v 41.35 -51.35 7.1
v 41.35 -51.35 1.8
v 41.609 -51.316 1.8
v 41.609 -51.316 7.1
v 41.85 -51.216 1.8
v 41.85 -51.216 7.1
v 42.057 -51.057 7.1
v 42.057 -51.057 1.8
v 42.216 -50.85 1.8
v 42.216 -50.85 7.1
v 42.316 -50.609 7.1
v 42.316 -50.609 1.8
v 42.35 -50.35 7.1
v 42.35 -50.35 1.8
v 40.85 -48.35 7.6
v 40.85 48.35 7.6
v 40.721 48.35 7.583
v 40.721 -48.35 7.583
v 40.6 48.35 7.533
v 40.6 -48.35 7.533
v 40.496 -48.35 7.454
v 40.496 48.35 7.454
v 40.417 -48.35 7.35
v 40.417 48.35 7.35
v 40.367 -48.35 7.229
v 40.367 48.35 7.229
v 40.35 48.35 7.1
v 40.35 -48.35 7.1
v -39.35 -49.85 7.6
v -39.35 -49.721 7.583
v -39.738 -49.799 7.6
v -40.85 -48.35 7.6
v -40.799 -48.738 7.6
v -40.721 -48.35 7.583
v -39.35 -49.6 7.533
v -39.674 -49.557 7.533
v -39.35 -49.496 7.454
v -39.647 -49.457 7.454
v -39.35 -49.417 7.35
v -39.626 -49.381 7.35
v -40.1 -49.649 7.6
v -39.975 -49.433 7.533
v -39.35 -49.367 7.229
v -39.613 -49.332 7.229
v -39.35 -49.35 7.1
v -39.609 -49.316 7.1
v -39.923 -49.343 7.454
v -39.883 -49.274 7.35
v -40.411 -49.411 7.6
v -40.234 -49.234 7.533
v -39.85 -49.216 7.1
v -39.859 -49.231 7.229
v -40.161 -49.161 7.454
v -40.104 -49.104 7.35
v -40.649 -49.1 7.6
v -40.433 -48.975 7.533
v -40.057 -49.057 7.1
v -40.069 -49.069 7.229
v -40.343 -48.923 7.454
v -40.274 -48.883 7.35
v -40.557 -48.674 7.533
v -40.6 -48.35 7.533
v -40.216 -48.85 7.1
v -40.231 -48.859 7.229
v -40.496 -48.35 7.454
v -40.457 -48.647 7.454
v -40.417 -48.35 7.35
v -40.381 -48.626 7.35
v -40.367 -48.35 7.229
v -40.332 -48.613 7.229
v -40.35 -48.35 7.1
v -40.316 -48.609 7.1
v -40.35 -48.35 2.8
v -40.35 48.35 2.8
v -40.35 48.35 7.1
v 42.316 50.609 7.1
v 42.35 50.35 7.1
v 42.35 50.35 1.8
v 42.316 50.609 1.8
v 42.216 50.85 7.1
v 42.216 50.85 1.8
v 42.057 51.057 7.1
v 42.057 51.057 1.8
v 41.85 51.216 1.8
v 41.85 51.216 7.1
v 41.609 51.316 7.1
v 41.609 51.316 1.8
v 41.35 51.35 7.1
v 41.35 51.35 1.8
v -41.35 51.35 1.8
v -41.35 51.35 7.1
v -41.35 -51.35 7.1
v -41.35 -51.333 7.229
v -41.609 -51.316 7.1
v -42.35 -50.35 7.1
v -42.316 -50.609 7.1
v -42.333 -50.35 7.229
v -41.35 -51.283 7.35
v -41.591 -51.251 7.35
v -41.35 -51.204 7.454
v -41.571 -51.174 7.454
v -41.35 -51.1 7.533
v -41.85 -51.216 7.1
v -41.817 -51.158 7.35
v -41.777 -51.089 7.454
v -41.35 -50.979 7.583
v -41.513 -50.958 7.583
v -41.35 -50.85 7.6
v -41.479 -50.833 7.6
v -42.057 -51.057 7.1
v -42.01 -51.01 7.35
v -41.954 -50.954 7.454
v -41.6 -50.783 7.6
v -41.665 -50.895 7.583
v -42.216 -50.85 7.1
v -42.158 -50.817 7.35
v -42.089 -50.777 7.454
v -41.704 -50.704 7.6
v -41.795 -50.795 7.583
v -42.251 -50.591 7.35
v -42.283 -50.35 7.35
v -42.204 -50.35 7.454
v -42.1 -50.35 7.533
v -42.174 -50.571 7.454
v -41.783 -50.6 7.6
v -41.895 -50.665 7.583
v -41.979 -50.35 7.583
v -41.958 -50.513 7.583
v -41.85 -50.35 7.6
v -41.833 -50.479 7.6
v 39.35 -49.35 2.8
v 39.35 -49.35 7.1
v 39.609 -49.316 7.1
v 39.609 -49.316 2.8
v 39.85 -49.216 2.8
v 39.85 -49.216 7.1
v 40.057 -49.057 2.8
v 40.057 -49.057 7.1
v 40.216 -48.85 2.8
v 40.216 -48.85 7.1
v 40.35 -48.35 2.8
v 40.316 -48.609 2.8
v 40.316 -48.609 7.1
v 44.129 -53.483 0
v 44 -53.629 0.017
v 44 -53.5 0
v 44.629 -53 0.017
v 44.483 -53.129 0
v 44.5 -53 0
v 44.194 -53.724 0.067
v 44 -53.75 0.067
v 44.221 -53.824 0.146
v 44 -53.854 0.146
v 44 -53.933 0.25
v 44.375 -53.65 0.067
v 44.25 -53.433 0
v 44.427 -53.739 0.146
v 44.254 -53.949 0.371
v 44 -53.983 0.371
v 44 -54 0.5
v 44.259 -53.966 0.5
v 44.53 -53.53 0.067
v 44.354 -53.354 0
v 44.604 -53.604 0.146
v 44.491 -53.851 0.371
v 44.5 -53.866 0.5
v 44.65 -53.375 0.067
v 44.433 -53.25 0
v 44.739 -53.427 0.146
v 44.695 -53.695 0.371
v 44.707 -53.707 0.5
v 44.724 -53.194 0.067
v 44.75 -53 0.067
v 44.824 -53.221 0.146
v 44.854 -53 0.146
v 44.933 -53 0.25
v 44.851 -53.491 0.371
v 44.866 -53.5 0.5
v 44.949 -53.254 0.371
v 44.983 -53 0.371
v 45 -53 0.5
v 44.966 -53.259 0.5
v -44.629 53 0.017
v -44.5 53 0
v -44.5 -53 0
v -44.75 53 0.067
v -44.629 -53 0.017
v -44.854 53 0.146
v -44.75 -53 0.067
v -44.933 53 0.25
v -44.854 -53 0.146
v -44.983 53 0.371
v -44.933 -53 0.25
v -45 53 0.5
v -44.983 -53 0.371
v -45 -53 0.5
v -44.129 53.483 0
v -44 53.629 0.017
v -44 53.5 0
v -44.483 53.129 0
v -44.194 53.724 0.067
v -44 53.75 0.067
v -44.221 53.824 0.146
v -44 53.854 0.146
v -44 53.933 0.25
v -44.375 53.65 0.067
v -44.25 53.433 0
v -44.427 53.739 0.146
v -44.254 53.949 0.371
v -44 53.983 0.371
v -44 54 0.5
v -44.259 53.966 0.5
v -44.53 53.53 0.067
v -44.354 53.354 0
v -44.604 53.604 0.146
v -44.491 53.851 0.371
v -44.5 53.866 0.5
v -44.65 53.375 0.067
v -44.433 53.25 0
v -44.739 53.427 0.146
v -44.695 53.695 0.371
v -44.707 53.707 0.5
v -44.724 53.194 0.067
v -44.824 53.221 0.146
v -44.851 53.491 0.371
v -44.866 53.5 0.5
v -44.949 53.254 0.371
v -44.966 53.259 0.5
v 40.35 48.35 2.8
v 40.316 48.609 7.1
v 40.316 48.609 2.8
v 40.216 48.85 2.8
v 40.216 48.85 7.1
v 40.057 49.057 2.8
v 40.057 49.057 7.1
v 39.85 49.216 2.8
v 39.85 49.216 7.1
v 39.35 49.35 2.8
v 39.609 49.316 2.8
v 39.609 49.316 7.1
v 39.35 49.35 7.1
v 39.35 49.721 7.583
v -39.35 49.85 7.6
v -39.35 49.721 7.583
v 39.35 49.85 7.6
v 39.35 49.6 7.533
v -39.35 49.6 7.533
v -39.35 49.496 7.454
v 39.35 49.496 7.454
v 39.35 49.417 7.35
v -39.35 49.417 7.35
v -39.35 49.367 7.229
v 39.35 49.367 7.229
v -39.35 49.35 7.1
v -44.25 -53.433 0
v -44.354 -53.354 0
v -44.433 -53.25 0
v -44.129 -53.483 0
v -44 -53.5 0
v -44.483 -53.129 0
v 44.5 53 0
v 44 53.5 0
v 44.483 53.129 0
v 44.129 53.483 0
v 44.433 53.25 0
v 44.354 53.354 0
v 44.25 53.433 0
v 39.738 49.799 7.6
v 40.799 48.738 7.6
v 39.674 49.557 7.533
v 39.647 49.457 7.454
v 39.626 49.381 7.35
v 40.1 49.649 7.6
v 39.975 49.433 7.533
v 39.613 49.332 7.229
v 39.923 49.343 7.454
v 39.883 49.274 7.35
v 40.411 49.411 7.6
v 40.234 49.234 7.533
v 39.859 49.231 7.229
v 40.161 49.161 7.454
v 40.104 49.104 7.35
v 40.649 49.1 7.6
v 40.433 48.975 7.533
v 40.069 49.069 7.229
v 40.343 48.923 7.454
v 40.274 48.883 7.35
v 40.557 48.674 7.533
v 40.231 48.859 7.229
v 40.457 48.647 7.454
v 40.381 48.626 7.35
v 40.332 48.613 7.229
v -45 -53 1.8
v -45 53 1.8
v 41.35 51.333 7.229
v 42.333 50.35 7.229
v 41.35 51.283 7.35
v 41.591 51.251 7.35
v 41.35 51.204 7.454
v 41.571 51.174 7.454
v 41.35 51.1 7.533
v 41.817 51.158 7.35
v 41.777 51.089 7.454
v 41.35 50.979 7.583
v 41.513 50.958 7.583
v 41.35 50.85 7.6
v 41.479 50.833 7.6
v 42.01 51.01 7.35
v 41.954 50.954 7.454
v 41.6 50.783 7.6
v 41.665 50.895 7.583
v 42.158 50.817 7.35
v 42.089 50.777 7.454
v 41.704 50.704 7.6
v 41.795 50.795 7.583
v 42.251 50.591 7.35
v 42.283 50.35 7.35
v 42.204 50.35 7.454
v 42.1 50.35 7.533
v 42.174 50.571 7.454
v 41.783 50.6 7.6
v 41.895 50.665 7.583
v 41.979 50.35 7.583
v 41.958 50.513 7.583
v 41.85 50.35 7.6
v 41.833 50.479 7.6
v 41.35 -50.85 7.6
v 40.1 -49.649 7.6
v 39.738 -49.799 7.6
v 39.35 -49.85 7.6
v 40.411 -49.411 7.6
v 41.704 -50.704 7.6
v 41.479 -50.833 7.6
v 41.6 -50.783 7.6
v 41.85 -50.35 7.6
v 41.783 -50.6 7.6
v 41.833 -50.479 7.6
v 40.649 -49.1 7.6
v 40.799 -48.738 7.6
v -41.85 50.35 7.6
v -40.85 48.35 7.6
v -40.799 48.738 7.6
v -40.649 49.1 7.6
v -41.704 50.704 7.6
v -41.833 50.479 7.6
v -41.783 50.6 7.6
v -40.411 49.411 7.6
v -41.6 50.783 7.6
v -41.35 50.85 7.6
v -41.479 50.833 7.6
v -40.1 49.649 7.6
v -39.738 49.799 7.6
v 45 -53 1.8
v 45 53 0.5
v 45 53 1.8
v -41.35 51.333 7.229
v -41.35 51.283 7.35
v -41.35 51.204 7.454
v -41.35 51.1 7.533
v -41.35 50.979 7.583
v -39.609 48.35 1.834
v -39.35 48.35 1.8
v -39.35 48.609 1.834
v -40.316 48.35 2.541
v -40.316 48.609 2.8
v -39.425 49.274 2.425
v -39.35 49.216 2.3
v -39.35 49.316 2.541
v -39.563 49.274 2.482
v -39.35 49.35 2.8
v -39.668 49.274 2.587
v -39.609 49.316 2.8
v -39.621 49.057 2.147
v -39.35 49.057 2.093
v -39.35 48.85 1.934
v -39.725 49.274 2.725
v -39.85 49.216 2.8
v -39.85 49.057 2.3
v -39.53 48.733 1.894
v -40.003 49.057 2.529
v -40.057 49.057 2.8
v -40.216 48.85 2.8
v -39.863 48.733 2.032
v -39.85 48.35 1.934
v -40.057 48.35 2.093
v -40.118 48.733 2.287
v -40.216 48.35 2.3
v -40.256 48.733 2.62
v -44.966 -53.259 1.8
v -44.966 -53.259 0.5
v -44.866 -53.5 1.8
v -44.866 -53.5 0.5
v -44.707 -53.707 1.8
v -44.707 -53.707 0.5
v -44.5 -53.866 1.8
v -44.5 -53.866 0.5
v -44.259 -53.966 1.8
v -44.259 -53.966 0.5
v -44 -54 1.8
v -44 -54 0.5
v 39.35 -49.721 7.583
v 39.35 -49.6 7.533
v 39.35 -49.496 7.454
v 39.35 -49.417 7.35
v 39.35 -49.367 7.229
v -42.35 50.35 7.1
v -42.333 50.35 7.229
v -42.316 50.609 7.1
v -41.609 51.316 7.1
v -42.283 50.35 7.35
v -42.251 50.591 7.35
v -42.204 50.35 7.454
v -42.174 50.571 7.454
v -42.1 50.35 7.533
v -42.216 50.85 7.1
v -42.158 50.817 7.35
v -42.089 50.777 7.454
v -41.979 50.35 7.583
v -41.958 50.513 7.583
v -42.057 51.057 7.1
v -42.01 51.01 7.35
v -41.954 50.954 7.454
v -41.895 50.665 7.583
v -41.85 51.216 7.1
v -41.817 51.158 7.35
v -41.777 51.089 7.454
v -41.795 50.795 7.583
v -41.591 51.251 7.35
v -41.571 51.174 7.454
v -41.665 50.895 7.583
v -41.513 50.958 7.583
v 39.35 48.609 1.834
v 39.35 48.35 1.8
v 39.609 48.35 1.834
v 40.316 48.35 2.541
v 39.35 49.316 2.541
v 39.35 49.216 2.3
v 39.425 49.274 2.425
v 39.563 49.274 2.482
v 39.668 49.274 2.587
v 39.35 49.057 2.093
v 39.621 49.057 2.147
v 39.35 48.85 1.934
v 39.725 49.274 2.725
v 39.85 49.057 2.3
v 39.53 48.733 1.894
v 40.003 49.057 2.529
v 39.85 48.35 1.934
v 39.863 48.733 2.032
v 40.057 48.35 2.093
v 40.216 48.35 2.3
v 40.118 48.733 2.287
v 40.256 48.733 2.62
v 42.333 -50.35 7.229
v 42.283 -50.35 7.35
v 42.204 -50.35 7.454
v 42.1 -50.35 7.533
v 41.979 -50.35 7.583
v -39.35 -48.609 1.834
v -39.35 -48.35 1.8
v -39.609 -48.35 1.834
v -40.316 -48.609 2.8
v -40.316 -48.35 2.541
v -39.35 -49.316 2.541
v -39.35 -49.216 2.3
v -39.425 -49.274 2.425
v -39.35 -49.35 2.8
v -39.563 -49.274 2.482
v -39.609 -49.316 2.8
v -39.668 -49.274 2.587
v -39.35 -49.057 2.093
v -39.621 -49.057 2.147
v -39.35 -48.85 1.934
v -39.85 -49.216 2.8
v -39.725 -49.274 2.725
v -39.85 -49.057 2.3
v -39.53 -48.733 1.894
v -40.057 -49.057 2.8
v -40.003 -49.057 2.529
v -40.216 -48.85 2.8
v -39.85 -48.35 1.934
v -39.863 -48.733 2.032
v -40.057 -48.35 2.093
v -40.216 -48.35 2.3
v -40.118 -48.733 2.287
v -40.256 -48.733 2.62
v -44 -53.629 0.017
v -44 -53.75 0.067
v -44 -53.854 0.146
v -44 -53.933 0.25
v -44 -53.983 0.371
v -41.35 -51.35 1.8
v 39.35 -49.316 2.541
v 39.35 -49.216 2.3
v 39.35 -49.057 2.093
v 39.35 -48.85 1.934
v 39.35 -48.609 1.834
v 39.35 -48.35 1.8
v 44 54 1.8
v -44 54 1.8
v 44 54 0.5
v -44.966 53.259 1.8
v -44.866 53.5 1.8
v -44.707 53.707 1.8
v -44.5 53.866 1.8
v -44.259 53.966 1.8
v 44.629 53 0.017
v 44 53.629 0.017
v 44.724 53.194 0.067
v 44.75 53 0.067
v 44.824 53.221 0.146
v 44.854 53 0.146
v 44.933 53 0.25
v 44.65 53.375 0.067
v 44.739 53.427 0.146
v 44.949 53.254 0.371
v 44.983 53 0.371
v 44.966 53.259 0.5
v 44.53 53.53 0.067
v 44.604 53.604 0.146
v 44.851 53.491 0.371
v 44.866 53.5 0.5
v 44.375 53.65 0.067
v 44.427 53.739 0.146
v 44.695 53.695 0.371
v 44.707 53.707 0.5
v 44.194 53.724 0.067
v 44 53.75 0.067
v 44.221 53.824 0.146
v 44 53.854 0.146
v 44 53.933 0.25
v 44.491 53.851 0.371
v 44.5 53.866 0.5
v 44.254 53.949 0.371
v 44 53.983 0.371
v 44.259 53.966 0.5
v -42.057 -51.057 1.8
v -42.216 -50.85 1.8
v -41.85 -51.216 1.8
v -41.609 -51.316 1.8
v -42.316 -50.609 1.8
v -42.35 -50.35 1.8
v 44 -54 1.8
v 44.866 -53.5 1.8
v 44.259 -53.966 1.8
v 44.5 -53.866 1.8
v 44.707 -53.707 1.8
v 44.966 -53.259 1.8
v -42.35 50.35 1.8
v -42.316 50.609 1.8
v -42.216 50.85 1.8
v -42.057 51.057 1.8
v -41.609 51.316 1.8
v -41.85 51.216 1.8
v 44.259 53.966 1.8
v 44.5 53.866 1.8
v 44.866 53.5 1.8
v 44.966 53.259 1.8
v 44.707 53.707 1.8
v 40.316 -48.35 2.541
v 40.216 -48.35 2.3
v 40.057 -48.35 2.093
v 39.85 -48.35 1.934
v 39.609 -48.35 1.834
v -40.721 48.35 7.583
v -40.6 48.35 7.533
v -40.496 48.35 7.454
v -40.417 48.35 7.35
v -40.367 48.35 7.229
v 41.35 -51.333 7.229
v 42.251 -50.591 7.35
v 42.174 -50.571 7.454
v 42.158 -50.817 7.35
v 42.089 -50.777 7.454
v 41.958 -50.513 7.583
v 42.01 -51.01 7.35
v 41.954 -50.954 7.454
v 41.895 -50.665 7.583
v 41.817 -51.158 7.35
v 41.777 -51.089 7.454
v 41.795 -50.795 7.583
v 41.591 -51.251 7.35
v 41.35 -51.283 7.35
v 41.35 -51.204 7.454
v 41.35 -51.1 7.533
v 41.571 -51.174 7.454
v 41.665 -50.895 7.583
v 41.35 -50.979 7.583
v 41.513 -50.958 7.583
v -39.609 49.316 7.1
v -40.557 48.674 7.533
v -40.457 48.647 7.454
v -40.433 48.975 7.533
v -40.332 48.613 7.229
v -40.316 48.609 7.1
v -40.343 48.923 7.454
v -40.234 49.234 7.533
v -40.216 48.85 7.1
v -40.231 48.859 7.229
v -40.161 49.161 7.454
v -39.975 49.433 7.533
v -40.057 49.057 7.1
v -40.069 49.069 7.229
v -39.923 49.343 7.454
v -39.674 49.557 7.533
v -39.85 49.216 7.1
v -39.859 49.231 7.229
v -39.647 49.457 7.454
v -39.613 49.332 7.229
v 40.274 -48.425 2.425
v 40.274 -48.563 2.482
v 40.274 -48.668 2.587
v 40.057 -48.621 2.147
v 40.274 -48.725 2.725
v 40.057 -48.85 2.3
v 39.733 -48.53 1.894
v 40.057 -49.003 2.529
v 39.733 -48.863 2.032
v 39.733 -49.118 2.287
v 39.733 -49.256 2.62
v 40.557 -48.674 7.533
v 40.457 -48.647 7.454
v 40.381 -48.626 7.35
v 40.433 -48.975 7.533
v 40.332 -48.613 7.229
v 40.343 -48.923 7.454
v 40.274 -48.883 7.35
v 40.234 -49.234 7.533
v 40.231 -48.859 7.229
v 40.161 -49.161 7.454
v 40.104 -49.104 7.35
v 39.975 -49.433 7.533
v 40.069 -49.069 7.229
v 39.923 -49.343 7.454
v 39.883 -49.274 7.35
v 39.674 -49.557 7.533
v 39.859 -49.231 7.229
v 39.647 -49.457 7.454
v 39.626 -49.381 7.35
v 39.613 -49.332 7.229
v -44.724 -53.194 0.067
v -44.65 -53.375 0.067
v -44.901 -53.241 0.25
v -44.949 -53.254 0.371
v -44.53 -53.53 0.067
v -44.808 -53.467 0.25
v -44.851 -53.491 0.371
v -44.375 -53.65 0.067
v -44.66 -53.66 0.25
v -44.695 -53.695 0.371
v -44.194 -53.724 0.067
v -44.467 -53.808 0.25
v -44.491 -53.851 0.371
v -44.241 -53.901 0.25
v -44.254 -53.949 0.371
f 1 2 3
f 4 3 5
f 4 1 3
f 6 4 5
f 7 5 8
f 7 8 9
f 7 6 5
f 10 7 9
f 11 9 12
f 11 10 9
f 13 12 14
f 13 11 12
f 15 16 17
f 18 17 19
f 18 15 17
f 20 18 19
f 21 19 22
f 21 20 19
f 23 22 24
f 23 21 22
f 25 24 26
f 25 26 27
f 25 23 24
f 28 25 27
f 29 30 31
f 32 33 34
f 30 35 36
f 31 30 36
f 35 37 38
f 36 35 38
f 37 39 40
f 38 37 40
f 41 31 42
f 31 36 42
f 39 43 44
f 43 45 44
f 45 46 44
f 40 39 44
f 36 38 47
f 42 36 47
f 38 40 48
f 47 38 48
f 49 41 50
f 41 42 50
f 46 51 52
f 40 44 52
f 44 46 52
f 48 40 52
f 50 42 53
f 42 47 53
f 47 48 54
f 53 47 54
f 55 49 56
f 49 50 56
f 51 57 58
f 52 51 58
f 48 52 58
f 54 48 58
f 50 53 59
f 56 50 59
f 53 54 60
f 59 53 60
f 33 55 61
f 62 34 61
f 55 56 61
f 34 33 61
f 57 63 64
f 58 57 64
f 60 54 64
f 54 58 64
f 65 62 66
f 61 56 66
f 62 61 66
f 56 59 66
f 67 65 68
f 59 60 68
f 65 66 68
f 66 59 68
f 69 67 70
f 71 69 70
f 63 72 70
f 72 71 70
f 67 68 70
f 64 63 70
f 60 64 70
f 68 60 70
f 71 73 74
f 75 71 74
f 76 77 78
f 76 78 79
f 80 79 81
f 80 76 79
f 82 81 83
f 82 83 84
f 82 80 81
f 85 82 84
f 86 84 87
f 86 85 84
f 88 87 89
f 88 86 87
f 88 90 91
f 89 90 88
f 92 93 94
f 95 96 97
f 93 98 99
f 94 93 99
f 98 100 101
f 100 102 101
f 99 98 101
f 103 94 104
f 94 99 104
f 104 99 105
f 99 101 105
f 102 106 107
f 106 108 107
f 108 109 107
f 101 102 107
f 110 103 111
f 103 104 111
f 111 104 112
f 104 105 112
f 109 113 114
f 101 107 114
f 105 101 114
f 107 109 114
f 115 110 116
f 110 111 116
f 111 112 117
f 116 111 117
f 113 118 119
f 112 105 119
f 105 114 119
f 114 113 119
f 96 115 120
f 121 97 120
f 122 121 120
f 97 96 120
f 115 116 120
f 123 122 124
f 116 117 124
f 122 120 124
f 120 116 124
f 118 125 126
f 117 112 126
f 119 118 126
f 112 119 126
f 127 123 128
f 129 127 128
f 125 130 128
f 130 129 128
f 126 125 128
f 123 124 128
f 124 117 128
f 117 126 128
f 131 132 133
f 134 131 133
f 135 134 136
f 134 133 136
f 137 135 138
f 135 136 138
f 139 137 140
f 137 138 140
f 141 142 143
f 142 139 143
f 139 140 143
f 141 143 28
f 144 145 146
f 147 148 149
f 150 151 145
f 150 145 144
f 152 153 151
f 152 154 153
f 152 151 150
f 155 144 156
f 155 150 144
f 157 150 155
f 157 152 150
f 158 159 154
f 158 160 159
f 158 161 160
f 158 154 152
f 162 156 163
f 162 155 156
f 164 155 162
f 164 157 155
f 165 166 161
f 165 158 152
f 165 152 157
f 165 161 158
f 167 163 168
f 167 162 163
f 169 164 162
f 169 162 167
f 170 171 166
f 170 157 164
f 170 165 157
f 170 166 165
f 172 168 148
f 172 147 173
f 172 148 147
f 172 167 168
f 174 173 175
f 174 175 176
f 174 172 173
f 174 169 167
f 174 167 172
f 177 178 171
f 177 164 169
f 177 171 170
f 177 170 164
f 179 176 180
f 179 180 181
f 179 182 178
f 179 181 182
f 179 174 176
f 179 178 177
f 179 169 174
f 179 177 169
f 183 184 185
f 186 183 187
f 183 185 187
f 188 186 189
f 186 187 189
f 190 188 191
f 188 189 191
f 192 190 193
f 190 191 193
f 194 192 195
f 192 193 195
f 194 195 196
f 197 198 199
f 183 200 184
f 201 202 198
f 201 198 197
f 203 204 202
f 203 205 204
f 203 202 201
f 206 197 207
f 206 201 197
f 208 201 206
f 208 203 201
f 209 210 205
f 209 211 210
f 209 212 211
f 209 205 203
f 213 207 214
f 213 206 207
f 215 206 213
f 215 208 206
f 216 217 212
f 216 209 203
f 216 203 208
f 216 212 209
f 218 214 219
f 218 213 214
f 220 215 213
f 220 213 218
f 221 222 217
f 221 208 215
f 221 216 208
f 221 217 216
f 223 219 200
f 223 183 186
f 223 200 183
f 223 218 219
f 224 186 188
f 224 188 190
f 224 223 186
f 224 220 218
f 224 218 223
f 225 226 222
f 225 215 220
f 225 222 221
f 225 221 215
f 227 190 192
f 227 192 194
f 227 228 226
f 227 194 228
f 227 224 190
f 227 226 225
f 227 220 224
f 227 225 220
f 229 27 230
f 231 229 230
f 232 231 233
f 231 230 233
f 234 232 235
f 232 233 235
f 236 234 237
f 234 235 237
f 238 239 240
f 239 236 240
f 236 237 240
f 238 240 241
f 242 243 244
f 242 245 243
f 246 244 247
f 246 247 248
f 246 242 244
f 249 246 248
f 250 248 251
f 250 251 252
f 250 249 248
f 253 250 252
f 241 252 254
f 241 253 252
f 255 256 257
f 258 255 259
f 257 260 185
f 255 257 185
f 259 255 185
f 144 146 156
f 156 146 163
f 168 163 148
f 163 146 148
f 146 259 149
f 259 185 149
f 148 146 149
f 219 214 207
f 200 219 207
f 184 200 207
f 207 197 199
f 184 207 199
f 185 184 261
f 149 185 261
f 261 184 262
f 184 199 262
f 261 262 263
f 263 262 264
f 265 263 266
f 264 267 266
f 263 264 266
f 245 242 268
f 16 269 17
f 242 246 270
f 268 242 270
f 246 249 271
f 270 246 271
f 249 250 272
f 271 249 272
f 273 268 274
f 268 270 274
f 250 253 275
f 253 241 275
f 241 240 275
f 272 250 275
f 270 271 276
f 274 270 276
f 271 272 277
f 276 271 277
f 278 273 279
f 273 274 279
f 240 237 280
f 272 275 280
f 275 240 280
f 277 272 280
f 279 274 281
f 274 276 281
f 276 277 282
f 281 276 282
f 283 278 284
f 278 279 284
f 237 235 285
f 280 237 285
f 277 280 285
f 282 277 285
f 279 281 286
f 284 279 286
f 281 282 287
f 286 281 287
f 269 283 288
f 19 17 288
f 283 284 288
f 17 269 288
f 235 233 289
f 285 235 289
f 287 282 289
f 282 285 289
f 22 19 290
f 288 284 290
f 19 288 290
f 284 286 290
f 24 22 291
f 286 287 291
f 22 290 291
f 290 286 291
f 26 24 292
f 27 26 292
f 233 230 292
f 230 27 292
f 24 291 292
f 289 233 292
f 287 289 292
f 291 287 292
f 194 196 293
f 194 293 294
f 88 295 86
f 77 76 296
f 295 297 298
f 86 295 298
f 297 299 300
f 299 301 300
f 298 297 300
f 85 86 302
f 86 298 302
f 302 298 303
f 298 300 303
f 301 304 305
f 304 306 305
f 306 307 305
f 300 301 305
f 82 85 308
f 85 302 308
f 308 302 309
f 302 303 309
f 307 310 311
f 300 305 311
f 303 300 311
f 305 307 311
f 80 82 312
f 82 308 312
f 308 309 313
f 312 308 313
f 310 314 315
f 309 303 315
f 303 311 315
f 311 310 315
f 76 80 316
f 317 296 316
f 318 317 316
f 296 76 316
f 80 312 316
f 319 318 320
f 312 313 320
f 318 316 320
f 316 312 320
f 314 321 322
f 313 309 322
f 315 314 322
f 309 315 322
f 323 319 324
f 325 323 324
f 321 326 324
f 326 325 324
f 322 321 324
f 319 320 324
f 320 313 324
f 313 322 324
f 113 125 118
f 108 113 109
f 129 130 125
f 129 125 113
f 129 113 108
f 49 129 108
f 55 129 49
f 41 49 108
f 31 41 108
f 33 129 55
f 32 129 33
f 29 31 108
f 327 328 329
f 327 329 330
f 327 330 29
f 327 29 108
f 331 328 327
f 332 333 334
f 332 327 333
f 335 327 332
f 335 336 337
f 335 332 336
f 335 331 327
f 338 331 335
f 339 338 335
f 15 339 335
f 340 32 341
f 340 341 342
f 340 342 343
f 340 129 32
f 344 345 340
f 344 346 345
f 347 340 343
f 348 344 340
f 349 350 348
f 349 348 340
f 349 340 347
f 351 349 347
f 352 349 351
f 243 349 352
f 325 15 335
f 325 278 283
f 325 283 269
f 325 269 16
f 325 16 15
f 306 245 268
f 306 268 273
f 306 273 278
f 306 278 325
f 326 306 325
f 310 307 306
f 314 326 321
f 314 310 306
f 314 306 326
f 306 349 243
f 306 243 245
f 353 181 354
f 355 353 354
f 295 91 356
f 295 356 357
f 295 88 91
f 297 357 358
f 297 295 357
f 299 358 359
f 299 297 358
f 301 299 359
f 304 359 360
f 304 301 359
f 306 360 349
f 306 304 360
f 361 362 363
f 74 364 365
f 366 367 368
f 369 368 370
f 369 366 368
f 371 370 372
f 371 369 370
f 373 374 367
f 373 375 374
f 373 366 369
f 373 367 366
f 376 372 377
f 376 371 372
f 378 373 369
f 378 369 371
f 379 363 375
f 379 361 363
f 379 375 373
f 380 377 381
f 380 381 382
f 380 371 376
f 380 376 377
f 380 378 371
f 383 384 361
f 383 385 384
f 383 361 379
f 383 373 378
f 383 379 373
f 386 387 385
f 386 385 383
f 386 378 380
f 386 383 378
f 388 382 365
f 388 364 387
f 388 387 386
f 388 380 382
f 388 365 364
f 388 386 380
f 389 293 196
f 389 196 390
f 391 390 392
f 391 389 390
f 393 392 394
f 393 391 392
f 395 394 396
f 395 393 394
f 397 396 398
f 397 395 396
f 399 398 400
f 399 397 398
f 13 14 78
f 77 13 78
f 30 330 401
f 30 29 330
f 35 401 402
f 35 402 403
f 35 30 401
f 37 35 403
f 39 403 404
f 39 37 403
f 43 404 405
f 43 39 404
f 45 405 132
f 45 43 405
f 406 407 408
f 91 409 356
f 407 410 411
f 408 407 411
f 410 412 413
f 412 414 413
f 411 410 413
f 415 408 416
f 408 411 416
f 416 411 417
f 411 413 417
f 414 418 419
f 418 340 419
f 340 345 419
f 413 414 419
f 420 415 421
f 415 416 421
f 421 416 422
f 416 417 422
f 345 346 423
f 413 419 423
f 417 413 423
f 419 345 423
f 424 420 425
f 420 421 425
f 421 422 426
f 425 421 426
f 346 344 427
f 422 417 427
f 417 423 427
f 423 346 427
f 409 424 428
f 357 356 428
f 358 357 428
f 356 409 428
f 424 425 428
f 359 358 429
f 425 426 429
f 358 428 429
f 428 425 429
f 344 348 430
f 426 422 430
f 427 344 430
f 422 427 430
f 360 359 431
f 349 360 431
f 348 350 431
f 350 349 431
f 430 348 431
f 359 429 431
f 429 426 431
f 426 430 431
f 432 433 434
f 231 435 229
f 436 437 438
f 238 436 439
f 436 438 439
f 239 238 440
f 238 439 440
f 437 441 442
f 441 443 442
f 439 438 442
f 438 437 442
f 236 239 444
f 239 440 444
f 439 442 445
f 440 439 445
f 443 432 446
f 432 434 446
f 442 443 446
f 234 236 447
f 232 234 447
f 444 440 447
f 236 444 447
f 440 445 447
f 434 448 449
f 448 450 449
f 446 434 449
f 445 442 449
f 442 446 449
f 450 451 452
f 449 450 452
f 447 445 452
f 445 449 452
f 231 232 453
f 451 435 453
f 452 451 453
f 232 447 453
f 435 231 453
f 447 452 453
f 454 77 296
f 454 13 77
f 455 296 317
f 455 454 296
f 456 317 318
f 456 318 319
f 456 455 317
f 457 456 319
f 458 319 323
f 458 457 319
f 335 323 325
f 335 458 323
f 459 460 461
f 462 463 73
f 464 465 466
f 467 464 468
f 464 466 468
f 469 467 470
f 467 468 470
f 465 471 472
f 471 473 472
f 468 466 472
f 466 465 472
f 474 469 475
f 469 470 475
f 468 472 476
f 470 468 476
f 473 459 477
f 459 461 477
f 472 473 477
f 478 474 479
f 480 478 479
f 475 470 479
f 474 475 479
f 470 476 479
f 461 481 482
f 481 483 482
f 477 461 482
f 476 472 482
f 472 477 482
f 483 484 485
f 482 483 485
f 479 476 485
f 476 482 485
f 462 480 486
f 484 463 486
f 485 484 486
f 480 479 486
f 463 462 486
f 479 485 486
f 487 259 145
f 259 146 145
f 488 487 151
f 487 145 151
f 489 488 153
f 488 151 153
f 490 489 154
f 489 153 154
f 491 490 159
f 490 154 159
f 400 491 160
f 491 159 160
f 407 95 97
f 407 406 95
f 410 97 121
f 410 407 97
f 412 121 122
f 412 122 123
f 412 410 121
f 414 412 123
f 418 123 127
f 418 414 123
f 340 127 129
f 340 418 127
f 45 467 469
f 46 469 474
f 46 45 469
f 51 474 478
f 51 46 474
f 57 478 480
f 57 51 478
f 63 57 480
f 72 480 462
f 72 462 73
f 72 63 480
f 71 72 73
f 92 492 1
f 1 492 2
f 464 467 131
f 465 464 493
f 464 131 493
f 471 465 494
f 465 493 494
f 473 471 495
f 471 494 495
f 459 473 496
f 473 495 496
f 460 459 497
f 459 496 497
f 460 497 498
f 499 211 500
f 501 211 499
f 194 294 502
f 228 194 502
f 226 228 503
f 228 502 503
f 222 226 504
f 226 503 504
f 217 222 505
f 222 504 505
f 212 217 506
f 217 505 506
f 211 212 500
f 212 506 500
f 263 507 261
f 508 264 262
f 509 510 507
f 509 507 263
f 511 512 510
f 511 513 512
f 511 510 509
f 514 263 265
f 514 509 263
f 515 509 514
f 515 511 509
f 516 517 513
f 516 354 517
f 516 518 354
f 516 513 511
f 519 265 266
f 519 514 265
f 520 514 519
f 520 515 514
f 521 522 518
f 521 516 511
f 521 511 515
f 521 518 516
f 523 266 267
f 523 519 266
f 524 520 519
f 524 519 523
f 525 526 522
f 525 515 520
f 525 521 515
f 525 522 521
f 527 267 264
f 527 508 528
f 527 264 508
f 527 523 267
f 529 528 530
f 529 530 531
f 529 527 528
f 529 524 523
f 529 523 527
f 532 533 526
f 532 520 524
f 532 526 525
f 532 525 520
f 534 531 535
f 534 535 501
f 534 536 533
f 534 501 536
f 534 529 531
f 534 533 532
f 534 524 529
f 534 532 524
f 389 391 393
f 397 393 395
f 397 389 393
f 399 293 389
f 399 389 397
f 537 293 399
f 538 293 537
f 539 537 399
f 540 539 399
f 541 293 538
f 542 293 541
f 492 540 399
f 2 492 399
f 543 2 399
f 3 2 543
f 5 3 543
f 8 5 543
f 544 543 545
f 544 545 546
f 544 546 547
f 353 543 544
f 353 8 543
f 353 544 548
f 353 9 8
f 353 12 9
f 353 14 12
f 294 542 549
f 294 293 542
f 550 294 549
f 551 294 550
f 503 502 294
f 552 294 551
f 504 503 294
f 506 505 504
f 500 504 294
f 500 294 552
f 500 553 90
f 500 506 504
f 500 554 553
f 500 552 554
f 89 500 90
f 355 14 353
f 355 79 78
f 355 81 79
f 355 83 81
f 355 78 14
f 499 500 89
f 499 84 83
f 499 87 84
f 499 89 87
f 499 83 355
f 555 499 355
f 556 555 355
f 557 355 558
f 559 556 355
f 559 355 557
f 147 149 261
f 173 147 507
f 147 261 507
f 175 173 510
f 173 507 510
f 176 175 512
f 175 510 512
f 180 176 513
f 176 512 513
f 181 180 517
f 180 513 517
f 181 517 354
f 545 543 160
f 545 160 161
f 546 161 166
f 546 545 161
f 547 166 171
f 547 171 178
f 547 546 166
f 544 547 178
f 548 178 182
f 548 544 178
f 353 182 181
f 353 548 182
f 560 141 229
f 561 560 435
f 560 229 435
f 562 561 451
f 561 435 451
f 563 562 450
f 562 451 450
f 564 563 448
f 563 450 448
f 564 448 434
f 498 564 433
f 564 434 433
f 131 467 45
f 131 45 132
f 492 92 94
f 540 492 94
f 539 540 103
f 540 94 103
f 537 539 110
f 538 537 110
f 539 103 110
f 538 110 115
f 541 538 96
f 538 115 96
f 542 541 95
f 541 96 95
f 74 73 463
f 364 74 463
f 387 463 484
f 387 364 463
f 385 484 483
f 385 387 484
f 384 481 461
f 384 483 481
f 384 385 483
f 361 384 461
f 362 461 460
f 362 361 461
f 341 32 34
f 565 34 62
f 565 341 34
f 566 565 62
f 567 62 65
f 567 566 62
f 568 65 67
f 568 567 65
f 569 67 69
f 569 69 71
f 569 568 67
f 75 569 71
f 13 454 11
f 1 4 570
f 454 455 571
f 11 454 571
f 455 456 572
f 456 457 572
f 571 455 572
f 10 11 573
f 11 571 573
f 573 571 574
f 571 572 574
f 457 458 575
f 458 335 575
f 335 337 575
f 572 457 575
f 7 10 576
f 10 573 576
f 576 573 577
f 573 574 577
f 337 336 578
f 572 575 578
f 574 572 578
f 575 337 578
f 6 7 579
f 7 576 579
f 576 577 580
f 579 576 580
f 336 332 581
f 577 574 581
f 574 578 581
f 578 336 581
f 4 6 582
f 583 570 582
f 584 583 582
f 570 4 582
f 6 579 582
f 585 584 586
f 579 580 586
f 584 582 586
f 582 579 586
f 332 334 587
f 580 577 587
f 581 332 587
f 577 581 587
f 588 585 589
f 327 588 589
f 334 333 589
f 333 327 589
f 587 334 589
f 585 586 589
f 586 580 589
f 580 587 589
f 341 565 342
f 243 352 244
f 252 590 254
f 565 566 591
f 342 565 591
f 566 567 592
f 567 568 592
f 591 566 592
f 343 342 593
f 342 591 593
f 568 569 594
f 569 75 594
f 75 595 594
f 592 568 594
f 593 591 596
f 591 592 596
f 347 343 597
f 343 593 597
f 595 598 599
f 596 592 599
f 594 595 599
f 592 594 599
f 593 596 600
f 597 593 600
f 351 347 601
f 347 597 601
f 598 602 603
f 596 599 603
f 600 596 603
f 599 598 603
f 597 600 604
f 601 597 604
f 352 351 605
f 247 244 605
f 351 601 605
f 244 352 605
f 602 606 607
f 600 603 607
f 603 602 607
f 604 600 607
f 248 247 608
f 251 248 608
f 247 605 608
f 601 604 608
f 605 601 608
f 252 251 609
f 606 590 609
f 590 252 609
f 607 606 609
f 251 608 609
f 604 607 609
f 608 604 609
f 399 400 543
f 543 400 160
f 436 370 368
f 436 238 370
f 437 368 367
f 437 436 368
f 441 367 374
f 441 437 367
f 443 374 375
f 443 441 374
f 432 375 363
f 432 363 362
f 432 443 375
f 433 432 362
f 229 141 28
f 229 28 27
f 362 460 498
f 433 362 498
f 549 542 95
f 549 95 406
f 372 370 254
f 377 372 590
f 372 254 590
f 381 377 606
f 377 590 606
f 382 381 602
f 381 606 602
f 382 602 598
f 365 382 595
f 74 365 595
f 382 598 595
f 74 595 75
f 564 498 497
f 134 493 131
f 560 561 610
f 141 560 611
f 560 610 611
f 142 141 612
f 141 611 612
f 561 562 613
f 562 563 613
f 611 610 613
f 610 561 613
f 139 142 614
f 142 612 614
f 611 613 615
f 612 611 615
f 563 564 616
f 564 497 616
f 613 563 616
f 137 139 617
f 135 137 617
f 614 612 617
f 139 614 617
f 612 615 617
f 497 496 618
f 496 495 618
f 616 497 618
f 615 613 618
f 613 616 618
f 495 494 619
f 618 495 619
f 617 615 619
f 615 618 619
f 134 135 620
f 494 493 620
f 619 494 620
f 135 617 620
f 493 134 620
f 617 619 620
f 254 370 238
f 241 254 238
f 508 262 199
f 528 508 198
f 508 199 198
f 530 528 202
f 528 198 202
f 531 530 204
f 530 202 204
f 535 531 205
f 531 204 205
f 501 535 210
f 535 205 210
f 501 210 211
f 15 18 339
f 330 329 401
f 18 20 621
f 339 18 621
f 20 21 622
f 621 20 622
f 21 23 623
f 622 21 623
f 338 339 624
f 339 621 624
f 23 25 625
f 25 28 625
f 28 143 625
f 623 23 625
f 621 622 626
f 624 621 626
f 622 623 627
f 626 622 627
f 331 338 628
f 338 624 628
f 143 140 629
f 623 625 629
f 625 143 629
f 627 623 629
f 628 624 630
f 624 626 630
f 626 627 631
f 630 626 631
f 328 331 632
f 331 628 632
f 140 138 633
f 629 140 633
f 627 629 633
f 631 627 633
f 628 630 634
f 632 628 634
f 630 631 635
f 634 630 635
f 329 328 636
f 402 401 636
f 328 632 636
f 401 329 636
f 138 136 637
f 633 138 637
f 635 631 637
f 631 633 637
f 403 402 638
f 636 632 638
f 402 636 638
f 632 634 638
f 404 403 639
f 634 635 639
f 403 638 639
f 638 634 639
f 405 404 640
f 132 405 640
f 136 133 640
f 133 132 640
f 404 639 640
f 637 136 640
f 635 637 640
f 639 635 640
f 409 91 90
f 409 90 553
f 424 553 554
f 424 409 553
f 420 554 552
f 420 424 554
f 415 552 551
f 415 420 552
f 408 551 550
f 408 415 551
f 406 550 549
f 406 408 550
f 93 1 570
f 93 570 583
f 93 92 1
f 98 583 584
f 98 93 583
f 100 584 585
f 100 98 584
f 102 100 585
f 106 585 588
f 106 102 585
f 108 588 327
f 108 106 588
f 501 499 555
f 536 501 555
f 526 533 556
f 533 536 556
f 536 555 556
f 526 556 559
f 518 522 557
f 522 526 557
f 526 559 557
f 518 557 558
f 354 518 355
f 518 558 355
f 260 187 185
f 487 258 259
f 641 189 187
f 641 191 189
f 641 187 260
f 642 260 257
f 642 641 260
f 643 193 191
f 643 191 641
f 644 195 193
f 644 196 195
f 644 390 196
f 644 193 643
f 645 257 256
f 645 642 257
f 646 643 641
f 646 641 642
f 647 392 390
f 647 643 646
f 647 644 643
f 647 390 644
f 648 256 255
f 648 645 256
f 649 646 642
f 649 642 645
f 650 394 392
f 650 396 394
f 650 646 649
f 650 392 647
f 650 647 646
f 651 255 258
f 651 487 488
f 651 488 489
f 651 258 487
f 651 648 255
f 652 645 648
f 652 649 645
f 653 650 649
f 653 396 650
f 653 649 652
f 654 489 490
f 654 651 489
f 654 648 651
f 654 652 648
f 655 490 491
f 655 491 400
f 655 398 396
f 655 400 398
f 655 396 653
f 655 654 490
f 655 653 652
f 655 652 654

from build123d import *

# Parameters (mm, degrees)
SKETCH1_W           = 90
SKETCH1_H           = 108
BOSS_EXTRUDE1_DEPTH = 1.8
SKETCH2_W           = 84.7
SKETCH2_H           = 102.7
SKETCH2_W_2         = 80.7
SKETCH2_H_2         = 98.7
BOSS_EXTRUDE2_DEPTH = 5.8
FILLET1_R           = 1
FILLET2_R           = 0.5


with BuildPart() as part:
    # Sketch1 → Boss-Extrude1 (new body)
    with BuildSketch(Plane.XY):
        Rectangle(SKETCH1_W, SKETCH1_H)
    extrude(amount=BOSS_EXTRUDE1_DEPTH)

    # Sketch2 → Boss-Extrude2 (add)
    with BuildSketch(Plane.XY.offset(1.8)):
        Rectangle(SKETCH2_W, SKETCH2_H)
        Rectangle(SKETCH2_W_2, SKETCH2_H_2, mode=Mode.SUBTRACT)
    extrude(amount=BOSS_EXTRUDE2_DEPTH)

    # Fillet1
    fillet1_edges = [part.edges().sort_by_distance(p)[0] for p in [
        (-40.35, 0, 1.8),
        (0, -49.35, 1.8),
        (40.35, 0, 1.8),
        (0, 49.35, 1.8),
        (-42.35, 51.35, 4.7),
        (-42.35, -51.35, 4.7),
        (42.35, -51.35, 4.7),
        (42.35, 51.35, 4.7),
        (-40.35, -49.35, 4.7),
        (40.35, -49.35, 4.7),
        (40.35, 49.35, 4.7),
        (-40.35, 49.35, 4.7),
        (45, -54, 0.9),
        (-45, -54, 0.9),
        (-45, 54, 0.9),
        (45, 54, 0.9),
    ]]
    fillet(fillet1_edges, radius=FILLET1_R)

    # Fillet2
    fillet2_edges = [part.edges().sort_by_distance(p)[0] for p in [
        (0, 49.35, 7.6),
        (40.35, 0, 7.6),
        (0, -49.35, 7.6),
        (-40.35, 0, 7.6),
        (0, -54, 0),
        (45, 0, 0),
        (-45, 0, 0),
        (0, 54, 0),
        (44.707106781, 53.707106781, 0),
        (44.707106781, -53.707106781, 0),
        (-44.707106781, 53.707106781, 0),
        (-44.707106781, -53.707106781, 0),
        (-42.35, 0, 7.6),
        (0, 51.35, 7.6),
        (0, -51.35, 7.6),
        (42.35, 0, 7.6),
        (42.057106781, 51.057106781, 7.6),
        (-42.057106781, -51.057106781, 7.6),
        (42.057106781, -51.057106781, 7.6),
        (-42.057106781, 51.057106781, 7.6),
        (40.057106781, -49.057106781, 7.6),
        (40.057106781, 49.057106781, 7.6),
        (-40.057106781, 49.057106781, 7.6),
        (-40.057106781, -49.057106781, 7.6),
    ]]
    fillet(fillet2_edges, radius=FILLET2_R)


solid = part.part
